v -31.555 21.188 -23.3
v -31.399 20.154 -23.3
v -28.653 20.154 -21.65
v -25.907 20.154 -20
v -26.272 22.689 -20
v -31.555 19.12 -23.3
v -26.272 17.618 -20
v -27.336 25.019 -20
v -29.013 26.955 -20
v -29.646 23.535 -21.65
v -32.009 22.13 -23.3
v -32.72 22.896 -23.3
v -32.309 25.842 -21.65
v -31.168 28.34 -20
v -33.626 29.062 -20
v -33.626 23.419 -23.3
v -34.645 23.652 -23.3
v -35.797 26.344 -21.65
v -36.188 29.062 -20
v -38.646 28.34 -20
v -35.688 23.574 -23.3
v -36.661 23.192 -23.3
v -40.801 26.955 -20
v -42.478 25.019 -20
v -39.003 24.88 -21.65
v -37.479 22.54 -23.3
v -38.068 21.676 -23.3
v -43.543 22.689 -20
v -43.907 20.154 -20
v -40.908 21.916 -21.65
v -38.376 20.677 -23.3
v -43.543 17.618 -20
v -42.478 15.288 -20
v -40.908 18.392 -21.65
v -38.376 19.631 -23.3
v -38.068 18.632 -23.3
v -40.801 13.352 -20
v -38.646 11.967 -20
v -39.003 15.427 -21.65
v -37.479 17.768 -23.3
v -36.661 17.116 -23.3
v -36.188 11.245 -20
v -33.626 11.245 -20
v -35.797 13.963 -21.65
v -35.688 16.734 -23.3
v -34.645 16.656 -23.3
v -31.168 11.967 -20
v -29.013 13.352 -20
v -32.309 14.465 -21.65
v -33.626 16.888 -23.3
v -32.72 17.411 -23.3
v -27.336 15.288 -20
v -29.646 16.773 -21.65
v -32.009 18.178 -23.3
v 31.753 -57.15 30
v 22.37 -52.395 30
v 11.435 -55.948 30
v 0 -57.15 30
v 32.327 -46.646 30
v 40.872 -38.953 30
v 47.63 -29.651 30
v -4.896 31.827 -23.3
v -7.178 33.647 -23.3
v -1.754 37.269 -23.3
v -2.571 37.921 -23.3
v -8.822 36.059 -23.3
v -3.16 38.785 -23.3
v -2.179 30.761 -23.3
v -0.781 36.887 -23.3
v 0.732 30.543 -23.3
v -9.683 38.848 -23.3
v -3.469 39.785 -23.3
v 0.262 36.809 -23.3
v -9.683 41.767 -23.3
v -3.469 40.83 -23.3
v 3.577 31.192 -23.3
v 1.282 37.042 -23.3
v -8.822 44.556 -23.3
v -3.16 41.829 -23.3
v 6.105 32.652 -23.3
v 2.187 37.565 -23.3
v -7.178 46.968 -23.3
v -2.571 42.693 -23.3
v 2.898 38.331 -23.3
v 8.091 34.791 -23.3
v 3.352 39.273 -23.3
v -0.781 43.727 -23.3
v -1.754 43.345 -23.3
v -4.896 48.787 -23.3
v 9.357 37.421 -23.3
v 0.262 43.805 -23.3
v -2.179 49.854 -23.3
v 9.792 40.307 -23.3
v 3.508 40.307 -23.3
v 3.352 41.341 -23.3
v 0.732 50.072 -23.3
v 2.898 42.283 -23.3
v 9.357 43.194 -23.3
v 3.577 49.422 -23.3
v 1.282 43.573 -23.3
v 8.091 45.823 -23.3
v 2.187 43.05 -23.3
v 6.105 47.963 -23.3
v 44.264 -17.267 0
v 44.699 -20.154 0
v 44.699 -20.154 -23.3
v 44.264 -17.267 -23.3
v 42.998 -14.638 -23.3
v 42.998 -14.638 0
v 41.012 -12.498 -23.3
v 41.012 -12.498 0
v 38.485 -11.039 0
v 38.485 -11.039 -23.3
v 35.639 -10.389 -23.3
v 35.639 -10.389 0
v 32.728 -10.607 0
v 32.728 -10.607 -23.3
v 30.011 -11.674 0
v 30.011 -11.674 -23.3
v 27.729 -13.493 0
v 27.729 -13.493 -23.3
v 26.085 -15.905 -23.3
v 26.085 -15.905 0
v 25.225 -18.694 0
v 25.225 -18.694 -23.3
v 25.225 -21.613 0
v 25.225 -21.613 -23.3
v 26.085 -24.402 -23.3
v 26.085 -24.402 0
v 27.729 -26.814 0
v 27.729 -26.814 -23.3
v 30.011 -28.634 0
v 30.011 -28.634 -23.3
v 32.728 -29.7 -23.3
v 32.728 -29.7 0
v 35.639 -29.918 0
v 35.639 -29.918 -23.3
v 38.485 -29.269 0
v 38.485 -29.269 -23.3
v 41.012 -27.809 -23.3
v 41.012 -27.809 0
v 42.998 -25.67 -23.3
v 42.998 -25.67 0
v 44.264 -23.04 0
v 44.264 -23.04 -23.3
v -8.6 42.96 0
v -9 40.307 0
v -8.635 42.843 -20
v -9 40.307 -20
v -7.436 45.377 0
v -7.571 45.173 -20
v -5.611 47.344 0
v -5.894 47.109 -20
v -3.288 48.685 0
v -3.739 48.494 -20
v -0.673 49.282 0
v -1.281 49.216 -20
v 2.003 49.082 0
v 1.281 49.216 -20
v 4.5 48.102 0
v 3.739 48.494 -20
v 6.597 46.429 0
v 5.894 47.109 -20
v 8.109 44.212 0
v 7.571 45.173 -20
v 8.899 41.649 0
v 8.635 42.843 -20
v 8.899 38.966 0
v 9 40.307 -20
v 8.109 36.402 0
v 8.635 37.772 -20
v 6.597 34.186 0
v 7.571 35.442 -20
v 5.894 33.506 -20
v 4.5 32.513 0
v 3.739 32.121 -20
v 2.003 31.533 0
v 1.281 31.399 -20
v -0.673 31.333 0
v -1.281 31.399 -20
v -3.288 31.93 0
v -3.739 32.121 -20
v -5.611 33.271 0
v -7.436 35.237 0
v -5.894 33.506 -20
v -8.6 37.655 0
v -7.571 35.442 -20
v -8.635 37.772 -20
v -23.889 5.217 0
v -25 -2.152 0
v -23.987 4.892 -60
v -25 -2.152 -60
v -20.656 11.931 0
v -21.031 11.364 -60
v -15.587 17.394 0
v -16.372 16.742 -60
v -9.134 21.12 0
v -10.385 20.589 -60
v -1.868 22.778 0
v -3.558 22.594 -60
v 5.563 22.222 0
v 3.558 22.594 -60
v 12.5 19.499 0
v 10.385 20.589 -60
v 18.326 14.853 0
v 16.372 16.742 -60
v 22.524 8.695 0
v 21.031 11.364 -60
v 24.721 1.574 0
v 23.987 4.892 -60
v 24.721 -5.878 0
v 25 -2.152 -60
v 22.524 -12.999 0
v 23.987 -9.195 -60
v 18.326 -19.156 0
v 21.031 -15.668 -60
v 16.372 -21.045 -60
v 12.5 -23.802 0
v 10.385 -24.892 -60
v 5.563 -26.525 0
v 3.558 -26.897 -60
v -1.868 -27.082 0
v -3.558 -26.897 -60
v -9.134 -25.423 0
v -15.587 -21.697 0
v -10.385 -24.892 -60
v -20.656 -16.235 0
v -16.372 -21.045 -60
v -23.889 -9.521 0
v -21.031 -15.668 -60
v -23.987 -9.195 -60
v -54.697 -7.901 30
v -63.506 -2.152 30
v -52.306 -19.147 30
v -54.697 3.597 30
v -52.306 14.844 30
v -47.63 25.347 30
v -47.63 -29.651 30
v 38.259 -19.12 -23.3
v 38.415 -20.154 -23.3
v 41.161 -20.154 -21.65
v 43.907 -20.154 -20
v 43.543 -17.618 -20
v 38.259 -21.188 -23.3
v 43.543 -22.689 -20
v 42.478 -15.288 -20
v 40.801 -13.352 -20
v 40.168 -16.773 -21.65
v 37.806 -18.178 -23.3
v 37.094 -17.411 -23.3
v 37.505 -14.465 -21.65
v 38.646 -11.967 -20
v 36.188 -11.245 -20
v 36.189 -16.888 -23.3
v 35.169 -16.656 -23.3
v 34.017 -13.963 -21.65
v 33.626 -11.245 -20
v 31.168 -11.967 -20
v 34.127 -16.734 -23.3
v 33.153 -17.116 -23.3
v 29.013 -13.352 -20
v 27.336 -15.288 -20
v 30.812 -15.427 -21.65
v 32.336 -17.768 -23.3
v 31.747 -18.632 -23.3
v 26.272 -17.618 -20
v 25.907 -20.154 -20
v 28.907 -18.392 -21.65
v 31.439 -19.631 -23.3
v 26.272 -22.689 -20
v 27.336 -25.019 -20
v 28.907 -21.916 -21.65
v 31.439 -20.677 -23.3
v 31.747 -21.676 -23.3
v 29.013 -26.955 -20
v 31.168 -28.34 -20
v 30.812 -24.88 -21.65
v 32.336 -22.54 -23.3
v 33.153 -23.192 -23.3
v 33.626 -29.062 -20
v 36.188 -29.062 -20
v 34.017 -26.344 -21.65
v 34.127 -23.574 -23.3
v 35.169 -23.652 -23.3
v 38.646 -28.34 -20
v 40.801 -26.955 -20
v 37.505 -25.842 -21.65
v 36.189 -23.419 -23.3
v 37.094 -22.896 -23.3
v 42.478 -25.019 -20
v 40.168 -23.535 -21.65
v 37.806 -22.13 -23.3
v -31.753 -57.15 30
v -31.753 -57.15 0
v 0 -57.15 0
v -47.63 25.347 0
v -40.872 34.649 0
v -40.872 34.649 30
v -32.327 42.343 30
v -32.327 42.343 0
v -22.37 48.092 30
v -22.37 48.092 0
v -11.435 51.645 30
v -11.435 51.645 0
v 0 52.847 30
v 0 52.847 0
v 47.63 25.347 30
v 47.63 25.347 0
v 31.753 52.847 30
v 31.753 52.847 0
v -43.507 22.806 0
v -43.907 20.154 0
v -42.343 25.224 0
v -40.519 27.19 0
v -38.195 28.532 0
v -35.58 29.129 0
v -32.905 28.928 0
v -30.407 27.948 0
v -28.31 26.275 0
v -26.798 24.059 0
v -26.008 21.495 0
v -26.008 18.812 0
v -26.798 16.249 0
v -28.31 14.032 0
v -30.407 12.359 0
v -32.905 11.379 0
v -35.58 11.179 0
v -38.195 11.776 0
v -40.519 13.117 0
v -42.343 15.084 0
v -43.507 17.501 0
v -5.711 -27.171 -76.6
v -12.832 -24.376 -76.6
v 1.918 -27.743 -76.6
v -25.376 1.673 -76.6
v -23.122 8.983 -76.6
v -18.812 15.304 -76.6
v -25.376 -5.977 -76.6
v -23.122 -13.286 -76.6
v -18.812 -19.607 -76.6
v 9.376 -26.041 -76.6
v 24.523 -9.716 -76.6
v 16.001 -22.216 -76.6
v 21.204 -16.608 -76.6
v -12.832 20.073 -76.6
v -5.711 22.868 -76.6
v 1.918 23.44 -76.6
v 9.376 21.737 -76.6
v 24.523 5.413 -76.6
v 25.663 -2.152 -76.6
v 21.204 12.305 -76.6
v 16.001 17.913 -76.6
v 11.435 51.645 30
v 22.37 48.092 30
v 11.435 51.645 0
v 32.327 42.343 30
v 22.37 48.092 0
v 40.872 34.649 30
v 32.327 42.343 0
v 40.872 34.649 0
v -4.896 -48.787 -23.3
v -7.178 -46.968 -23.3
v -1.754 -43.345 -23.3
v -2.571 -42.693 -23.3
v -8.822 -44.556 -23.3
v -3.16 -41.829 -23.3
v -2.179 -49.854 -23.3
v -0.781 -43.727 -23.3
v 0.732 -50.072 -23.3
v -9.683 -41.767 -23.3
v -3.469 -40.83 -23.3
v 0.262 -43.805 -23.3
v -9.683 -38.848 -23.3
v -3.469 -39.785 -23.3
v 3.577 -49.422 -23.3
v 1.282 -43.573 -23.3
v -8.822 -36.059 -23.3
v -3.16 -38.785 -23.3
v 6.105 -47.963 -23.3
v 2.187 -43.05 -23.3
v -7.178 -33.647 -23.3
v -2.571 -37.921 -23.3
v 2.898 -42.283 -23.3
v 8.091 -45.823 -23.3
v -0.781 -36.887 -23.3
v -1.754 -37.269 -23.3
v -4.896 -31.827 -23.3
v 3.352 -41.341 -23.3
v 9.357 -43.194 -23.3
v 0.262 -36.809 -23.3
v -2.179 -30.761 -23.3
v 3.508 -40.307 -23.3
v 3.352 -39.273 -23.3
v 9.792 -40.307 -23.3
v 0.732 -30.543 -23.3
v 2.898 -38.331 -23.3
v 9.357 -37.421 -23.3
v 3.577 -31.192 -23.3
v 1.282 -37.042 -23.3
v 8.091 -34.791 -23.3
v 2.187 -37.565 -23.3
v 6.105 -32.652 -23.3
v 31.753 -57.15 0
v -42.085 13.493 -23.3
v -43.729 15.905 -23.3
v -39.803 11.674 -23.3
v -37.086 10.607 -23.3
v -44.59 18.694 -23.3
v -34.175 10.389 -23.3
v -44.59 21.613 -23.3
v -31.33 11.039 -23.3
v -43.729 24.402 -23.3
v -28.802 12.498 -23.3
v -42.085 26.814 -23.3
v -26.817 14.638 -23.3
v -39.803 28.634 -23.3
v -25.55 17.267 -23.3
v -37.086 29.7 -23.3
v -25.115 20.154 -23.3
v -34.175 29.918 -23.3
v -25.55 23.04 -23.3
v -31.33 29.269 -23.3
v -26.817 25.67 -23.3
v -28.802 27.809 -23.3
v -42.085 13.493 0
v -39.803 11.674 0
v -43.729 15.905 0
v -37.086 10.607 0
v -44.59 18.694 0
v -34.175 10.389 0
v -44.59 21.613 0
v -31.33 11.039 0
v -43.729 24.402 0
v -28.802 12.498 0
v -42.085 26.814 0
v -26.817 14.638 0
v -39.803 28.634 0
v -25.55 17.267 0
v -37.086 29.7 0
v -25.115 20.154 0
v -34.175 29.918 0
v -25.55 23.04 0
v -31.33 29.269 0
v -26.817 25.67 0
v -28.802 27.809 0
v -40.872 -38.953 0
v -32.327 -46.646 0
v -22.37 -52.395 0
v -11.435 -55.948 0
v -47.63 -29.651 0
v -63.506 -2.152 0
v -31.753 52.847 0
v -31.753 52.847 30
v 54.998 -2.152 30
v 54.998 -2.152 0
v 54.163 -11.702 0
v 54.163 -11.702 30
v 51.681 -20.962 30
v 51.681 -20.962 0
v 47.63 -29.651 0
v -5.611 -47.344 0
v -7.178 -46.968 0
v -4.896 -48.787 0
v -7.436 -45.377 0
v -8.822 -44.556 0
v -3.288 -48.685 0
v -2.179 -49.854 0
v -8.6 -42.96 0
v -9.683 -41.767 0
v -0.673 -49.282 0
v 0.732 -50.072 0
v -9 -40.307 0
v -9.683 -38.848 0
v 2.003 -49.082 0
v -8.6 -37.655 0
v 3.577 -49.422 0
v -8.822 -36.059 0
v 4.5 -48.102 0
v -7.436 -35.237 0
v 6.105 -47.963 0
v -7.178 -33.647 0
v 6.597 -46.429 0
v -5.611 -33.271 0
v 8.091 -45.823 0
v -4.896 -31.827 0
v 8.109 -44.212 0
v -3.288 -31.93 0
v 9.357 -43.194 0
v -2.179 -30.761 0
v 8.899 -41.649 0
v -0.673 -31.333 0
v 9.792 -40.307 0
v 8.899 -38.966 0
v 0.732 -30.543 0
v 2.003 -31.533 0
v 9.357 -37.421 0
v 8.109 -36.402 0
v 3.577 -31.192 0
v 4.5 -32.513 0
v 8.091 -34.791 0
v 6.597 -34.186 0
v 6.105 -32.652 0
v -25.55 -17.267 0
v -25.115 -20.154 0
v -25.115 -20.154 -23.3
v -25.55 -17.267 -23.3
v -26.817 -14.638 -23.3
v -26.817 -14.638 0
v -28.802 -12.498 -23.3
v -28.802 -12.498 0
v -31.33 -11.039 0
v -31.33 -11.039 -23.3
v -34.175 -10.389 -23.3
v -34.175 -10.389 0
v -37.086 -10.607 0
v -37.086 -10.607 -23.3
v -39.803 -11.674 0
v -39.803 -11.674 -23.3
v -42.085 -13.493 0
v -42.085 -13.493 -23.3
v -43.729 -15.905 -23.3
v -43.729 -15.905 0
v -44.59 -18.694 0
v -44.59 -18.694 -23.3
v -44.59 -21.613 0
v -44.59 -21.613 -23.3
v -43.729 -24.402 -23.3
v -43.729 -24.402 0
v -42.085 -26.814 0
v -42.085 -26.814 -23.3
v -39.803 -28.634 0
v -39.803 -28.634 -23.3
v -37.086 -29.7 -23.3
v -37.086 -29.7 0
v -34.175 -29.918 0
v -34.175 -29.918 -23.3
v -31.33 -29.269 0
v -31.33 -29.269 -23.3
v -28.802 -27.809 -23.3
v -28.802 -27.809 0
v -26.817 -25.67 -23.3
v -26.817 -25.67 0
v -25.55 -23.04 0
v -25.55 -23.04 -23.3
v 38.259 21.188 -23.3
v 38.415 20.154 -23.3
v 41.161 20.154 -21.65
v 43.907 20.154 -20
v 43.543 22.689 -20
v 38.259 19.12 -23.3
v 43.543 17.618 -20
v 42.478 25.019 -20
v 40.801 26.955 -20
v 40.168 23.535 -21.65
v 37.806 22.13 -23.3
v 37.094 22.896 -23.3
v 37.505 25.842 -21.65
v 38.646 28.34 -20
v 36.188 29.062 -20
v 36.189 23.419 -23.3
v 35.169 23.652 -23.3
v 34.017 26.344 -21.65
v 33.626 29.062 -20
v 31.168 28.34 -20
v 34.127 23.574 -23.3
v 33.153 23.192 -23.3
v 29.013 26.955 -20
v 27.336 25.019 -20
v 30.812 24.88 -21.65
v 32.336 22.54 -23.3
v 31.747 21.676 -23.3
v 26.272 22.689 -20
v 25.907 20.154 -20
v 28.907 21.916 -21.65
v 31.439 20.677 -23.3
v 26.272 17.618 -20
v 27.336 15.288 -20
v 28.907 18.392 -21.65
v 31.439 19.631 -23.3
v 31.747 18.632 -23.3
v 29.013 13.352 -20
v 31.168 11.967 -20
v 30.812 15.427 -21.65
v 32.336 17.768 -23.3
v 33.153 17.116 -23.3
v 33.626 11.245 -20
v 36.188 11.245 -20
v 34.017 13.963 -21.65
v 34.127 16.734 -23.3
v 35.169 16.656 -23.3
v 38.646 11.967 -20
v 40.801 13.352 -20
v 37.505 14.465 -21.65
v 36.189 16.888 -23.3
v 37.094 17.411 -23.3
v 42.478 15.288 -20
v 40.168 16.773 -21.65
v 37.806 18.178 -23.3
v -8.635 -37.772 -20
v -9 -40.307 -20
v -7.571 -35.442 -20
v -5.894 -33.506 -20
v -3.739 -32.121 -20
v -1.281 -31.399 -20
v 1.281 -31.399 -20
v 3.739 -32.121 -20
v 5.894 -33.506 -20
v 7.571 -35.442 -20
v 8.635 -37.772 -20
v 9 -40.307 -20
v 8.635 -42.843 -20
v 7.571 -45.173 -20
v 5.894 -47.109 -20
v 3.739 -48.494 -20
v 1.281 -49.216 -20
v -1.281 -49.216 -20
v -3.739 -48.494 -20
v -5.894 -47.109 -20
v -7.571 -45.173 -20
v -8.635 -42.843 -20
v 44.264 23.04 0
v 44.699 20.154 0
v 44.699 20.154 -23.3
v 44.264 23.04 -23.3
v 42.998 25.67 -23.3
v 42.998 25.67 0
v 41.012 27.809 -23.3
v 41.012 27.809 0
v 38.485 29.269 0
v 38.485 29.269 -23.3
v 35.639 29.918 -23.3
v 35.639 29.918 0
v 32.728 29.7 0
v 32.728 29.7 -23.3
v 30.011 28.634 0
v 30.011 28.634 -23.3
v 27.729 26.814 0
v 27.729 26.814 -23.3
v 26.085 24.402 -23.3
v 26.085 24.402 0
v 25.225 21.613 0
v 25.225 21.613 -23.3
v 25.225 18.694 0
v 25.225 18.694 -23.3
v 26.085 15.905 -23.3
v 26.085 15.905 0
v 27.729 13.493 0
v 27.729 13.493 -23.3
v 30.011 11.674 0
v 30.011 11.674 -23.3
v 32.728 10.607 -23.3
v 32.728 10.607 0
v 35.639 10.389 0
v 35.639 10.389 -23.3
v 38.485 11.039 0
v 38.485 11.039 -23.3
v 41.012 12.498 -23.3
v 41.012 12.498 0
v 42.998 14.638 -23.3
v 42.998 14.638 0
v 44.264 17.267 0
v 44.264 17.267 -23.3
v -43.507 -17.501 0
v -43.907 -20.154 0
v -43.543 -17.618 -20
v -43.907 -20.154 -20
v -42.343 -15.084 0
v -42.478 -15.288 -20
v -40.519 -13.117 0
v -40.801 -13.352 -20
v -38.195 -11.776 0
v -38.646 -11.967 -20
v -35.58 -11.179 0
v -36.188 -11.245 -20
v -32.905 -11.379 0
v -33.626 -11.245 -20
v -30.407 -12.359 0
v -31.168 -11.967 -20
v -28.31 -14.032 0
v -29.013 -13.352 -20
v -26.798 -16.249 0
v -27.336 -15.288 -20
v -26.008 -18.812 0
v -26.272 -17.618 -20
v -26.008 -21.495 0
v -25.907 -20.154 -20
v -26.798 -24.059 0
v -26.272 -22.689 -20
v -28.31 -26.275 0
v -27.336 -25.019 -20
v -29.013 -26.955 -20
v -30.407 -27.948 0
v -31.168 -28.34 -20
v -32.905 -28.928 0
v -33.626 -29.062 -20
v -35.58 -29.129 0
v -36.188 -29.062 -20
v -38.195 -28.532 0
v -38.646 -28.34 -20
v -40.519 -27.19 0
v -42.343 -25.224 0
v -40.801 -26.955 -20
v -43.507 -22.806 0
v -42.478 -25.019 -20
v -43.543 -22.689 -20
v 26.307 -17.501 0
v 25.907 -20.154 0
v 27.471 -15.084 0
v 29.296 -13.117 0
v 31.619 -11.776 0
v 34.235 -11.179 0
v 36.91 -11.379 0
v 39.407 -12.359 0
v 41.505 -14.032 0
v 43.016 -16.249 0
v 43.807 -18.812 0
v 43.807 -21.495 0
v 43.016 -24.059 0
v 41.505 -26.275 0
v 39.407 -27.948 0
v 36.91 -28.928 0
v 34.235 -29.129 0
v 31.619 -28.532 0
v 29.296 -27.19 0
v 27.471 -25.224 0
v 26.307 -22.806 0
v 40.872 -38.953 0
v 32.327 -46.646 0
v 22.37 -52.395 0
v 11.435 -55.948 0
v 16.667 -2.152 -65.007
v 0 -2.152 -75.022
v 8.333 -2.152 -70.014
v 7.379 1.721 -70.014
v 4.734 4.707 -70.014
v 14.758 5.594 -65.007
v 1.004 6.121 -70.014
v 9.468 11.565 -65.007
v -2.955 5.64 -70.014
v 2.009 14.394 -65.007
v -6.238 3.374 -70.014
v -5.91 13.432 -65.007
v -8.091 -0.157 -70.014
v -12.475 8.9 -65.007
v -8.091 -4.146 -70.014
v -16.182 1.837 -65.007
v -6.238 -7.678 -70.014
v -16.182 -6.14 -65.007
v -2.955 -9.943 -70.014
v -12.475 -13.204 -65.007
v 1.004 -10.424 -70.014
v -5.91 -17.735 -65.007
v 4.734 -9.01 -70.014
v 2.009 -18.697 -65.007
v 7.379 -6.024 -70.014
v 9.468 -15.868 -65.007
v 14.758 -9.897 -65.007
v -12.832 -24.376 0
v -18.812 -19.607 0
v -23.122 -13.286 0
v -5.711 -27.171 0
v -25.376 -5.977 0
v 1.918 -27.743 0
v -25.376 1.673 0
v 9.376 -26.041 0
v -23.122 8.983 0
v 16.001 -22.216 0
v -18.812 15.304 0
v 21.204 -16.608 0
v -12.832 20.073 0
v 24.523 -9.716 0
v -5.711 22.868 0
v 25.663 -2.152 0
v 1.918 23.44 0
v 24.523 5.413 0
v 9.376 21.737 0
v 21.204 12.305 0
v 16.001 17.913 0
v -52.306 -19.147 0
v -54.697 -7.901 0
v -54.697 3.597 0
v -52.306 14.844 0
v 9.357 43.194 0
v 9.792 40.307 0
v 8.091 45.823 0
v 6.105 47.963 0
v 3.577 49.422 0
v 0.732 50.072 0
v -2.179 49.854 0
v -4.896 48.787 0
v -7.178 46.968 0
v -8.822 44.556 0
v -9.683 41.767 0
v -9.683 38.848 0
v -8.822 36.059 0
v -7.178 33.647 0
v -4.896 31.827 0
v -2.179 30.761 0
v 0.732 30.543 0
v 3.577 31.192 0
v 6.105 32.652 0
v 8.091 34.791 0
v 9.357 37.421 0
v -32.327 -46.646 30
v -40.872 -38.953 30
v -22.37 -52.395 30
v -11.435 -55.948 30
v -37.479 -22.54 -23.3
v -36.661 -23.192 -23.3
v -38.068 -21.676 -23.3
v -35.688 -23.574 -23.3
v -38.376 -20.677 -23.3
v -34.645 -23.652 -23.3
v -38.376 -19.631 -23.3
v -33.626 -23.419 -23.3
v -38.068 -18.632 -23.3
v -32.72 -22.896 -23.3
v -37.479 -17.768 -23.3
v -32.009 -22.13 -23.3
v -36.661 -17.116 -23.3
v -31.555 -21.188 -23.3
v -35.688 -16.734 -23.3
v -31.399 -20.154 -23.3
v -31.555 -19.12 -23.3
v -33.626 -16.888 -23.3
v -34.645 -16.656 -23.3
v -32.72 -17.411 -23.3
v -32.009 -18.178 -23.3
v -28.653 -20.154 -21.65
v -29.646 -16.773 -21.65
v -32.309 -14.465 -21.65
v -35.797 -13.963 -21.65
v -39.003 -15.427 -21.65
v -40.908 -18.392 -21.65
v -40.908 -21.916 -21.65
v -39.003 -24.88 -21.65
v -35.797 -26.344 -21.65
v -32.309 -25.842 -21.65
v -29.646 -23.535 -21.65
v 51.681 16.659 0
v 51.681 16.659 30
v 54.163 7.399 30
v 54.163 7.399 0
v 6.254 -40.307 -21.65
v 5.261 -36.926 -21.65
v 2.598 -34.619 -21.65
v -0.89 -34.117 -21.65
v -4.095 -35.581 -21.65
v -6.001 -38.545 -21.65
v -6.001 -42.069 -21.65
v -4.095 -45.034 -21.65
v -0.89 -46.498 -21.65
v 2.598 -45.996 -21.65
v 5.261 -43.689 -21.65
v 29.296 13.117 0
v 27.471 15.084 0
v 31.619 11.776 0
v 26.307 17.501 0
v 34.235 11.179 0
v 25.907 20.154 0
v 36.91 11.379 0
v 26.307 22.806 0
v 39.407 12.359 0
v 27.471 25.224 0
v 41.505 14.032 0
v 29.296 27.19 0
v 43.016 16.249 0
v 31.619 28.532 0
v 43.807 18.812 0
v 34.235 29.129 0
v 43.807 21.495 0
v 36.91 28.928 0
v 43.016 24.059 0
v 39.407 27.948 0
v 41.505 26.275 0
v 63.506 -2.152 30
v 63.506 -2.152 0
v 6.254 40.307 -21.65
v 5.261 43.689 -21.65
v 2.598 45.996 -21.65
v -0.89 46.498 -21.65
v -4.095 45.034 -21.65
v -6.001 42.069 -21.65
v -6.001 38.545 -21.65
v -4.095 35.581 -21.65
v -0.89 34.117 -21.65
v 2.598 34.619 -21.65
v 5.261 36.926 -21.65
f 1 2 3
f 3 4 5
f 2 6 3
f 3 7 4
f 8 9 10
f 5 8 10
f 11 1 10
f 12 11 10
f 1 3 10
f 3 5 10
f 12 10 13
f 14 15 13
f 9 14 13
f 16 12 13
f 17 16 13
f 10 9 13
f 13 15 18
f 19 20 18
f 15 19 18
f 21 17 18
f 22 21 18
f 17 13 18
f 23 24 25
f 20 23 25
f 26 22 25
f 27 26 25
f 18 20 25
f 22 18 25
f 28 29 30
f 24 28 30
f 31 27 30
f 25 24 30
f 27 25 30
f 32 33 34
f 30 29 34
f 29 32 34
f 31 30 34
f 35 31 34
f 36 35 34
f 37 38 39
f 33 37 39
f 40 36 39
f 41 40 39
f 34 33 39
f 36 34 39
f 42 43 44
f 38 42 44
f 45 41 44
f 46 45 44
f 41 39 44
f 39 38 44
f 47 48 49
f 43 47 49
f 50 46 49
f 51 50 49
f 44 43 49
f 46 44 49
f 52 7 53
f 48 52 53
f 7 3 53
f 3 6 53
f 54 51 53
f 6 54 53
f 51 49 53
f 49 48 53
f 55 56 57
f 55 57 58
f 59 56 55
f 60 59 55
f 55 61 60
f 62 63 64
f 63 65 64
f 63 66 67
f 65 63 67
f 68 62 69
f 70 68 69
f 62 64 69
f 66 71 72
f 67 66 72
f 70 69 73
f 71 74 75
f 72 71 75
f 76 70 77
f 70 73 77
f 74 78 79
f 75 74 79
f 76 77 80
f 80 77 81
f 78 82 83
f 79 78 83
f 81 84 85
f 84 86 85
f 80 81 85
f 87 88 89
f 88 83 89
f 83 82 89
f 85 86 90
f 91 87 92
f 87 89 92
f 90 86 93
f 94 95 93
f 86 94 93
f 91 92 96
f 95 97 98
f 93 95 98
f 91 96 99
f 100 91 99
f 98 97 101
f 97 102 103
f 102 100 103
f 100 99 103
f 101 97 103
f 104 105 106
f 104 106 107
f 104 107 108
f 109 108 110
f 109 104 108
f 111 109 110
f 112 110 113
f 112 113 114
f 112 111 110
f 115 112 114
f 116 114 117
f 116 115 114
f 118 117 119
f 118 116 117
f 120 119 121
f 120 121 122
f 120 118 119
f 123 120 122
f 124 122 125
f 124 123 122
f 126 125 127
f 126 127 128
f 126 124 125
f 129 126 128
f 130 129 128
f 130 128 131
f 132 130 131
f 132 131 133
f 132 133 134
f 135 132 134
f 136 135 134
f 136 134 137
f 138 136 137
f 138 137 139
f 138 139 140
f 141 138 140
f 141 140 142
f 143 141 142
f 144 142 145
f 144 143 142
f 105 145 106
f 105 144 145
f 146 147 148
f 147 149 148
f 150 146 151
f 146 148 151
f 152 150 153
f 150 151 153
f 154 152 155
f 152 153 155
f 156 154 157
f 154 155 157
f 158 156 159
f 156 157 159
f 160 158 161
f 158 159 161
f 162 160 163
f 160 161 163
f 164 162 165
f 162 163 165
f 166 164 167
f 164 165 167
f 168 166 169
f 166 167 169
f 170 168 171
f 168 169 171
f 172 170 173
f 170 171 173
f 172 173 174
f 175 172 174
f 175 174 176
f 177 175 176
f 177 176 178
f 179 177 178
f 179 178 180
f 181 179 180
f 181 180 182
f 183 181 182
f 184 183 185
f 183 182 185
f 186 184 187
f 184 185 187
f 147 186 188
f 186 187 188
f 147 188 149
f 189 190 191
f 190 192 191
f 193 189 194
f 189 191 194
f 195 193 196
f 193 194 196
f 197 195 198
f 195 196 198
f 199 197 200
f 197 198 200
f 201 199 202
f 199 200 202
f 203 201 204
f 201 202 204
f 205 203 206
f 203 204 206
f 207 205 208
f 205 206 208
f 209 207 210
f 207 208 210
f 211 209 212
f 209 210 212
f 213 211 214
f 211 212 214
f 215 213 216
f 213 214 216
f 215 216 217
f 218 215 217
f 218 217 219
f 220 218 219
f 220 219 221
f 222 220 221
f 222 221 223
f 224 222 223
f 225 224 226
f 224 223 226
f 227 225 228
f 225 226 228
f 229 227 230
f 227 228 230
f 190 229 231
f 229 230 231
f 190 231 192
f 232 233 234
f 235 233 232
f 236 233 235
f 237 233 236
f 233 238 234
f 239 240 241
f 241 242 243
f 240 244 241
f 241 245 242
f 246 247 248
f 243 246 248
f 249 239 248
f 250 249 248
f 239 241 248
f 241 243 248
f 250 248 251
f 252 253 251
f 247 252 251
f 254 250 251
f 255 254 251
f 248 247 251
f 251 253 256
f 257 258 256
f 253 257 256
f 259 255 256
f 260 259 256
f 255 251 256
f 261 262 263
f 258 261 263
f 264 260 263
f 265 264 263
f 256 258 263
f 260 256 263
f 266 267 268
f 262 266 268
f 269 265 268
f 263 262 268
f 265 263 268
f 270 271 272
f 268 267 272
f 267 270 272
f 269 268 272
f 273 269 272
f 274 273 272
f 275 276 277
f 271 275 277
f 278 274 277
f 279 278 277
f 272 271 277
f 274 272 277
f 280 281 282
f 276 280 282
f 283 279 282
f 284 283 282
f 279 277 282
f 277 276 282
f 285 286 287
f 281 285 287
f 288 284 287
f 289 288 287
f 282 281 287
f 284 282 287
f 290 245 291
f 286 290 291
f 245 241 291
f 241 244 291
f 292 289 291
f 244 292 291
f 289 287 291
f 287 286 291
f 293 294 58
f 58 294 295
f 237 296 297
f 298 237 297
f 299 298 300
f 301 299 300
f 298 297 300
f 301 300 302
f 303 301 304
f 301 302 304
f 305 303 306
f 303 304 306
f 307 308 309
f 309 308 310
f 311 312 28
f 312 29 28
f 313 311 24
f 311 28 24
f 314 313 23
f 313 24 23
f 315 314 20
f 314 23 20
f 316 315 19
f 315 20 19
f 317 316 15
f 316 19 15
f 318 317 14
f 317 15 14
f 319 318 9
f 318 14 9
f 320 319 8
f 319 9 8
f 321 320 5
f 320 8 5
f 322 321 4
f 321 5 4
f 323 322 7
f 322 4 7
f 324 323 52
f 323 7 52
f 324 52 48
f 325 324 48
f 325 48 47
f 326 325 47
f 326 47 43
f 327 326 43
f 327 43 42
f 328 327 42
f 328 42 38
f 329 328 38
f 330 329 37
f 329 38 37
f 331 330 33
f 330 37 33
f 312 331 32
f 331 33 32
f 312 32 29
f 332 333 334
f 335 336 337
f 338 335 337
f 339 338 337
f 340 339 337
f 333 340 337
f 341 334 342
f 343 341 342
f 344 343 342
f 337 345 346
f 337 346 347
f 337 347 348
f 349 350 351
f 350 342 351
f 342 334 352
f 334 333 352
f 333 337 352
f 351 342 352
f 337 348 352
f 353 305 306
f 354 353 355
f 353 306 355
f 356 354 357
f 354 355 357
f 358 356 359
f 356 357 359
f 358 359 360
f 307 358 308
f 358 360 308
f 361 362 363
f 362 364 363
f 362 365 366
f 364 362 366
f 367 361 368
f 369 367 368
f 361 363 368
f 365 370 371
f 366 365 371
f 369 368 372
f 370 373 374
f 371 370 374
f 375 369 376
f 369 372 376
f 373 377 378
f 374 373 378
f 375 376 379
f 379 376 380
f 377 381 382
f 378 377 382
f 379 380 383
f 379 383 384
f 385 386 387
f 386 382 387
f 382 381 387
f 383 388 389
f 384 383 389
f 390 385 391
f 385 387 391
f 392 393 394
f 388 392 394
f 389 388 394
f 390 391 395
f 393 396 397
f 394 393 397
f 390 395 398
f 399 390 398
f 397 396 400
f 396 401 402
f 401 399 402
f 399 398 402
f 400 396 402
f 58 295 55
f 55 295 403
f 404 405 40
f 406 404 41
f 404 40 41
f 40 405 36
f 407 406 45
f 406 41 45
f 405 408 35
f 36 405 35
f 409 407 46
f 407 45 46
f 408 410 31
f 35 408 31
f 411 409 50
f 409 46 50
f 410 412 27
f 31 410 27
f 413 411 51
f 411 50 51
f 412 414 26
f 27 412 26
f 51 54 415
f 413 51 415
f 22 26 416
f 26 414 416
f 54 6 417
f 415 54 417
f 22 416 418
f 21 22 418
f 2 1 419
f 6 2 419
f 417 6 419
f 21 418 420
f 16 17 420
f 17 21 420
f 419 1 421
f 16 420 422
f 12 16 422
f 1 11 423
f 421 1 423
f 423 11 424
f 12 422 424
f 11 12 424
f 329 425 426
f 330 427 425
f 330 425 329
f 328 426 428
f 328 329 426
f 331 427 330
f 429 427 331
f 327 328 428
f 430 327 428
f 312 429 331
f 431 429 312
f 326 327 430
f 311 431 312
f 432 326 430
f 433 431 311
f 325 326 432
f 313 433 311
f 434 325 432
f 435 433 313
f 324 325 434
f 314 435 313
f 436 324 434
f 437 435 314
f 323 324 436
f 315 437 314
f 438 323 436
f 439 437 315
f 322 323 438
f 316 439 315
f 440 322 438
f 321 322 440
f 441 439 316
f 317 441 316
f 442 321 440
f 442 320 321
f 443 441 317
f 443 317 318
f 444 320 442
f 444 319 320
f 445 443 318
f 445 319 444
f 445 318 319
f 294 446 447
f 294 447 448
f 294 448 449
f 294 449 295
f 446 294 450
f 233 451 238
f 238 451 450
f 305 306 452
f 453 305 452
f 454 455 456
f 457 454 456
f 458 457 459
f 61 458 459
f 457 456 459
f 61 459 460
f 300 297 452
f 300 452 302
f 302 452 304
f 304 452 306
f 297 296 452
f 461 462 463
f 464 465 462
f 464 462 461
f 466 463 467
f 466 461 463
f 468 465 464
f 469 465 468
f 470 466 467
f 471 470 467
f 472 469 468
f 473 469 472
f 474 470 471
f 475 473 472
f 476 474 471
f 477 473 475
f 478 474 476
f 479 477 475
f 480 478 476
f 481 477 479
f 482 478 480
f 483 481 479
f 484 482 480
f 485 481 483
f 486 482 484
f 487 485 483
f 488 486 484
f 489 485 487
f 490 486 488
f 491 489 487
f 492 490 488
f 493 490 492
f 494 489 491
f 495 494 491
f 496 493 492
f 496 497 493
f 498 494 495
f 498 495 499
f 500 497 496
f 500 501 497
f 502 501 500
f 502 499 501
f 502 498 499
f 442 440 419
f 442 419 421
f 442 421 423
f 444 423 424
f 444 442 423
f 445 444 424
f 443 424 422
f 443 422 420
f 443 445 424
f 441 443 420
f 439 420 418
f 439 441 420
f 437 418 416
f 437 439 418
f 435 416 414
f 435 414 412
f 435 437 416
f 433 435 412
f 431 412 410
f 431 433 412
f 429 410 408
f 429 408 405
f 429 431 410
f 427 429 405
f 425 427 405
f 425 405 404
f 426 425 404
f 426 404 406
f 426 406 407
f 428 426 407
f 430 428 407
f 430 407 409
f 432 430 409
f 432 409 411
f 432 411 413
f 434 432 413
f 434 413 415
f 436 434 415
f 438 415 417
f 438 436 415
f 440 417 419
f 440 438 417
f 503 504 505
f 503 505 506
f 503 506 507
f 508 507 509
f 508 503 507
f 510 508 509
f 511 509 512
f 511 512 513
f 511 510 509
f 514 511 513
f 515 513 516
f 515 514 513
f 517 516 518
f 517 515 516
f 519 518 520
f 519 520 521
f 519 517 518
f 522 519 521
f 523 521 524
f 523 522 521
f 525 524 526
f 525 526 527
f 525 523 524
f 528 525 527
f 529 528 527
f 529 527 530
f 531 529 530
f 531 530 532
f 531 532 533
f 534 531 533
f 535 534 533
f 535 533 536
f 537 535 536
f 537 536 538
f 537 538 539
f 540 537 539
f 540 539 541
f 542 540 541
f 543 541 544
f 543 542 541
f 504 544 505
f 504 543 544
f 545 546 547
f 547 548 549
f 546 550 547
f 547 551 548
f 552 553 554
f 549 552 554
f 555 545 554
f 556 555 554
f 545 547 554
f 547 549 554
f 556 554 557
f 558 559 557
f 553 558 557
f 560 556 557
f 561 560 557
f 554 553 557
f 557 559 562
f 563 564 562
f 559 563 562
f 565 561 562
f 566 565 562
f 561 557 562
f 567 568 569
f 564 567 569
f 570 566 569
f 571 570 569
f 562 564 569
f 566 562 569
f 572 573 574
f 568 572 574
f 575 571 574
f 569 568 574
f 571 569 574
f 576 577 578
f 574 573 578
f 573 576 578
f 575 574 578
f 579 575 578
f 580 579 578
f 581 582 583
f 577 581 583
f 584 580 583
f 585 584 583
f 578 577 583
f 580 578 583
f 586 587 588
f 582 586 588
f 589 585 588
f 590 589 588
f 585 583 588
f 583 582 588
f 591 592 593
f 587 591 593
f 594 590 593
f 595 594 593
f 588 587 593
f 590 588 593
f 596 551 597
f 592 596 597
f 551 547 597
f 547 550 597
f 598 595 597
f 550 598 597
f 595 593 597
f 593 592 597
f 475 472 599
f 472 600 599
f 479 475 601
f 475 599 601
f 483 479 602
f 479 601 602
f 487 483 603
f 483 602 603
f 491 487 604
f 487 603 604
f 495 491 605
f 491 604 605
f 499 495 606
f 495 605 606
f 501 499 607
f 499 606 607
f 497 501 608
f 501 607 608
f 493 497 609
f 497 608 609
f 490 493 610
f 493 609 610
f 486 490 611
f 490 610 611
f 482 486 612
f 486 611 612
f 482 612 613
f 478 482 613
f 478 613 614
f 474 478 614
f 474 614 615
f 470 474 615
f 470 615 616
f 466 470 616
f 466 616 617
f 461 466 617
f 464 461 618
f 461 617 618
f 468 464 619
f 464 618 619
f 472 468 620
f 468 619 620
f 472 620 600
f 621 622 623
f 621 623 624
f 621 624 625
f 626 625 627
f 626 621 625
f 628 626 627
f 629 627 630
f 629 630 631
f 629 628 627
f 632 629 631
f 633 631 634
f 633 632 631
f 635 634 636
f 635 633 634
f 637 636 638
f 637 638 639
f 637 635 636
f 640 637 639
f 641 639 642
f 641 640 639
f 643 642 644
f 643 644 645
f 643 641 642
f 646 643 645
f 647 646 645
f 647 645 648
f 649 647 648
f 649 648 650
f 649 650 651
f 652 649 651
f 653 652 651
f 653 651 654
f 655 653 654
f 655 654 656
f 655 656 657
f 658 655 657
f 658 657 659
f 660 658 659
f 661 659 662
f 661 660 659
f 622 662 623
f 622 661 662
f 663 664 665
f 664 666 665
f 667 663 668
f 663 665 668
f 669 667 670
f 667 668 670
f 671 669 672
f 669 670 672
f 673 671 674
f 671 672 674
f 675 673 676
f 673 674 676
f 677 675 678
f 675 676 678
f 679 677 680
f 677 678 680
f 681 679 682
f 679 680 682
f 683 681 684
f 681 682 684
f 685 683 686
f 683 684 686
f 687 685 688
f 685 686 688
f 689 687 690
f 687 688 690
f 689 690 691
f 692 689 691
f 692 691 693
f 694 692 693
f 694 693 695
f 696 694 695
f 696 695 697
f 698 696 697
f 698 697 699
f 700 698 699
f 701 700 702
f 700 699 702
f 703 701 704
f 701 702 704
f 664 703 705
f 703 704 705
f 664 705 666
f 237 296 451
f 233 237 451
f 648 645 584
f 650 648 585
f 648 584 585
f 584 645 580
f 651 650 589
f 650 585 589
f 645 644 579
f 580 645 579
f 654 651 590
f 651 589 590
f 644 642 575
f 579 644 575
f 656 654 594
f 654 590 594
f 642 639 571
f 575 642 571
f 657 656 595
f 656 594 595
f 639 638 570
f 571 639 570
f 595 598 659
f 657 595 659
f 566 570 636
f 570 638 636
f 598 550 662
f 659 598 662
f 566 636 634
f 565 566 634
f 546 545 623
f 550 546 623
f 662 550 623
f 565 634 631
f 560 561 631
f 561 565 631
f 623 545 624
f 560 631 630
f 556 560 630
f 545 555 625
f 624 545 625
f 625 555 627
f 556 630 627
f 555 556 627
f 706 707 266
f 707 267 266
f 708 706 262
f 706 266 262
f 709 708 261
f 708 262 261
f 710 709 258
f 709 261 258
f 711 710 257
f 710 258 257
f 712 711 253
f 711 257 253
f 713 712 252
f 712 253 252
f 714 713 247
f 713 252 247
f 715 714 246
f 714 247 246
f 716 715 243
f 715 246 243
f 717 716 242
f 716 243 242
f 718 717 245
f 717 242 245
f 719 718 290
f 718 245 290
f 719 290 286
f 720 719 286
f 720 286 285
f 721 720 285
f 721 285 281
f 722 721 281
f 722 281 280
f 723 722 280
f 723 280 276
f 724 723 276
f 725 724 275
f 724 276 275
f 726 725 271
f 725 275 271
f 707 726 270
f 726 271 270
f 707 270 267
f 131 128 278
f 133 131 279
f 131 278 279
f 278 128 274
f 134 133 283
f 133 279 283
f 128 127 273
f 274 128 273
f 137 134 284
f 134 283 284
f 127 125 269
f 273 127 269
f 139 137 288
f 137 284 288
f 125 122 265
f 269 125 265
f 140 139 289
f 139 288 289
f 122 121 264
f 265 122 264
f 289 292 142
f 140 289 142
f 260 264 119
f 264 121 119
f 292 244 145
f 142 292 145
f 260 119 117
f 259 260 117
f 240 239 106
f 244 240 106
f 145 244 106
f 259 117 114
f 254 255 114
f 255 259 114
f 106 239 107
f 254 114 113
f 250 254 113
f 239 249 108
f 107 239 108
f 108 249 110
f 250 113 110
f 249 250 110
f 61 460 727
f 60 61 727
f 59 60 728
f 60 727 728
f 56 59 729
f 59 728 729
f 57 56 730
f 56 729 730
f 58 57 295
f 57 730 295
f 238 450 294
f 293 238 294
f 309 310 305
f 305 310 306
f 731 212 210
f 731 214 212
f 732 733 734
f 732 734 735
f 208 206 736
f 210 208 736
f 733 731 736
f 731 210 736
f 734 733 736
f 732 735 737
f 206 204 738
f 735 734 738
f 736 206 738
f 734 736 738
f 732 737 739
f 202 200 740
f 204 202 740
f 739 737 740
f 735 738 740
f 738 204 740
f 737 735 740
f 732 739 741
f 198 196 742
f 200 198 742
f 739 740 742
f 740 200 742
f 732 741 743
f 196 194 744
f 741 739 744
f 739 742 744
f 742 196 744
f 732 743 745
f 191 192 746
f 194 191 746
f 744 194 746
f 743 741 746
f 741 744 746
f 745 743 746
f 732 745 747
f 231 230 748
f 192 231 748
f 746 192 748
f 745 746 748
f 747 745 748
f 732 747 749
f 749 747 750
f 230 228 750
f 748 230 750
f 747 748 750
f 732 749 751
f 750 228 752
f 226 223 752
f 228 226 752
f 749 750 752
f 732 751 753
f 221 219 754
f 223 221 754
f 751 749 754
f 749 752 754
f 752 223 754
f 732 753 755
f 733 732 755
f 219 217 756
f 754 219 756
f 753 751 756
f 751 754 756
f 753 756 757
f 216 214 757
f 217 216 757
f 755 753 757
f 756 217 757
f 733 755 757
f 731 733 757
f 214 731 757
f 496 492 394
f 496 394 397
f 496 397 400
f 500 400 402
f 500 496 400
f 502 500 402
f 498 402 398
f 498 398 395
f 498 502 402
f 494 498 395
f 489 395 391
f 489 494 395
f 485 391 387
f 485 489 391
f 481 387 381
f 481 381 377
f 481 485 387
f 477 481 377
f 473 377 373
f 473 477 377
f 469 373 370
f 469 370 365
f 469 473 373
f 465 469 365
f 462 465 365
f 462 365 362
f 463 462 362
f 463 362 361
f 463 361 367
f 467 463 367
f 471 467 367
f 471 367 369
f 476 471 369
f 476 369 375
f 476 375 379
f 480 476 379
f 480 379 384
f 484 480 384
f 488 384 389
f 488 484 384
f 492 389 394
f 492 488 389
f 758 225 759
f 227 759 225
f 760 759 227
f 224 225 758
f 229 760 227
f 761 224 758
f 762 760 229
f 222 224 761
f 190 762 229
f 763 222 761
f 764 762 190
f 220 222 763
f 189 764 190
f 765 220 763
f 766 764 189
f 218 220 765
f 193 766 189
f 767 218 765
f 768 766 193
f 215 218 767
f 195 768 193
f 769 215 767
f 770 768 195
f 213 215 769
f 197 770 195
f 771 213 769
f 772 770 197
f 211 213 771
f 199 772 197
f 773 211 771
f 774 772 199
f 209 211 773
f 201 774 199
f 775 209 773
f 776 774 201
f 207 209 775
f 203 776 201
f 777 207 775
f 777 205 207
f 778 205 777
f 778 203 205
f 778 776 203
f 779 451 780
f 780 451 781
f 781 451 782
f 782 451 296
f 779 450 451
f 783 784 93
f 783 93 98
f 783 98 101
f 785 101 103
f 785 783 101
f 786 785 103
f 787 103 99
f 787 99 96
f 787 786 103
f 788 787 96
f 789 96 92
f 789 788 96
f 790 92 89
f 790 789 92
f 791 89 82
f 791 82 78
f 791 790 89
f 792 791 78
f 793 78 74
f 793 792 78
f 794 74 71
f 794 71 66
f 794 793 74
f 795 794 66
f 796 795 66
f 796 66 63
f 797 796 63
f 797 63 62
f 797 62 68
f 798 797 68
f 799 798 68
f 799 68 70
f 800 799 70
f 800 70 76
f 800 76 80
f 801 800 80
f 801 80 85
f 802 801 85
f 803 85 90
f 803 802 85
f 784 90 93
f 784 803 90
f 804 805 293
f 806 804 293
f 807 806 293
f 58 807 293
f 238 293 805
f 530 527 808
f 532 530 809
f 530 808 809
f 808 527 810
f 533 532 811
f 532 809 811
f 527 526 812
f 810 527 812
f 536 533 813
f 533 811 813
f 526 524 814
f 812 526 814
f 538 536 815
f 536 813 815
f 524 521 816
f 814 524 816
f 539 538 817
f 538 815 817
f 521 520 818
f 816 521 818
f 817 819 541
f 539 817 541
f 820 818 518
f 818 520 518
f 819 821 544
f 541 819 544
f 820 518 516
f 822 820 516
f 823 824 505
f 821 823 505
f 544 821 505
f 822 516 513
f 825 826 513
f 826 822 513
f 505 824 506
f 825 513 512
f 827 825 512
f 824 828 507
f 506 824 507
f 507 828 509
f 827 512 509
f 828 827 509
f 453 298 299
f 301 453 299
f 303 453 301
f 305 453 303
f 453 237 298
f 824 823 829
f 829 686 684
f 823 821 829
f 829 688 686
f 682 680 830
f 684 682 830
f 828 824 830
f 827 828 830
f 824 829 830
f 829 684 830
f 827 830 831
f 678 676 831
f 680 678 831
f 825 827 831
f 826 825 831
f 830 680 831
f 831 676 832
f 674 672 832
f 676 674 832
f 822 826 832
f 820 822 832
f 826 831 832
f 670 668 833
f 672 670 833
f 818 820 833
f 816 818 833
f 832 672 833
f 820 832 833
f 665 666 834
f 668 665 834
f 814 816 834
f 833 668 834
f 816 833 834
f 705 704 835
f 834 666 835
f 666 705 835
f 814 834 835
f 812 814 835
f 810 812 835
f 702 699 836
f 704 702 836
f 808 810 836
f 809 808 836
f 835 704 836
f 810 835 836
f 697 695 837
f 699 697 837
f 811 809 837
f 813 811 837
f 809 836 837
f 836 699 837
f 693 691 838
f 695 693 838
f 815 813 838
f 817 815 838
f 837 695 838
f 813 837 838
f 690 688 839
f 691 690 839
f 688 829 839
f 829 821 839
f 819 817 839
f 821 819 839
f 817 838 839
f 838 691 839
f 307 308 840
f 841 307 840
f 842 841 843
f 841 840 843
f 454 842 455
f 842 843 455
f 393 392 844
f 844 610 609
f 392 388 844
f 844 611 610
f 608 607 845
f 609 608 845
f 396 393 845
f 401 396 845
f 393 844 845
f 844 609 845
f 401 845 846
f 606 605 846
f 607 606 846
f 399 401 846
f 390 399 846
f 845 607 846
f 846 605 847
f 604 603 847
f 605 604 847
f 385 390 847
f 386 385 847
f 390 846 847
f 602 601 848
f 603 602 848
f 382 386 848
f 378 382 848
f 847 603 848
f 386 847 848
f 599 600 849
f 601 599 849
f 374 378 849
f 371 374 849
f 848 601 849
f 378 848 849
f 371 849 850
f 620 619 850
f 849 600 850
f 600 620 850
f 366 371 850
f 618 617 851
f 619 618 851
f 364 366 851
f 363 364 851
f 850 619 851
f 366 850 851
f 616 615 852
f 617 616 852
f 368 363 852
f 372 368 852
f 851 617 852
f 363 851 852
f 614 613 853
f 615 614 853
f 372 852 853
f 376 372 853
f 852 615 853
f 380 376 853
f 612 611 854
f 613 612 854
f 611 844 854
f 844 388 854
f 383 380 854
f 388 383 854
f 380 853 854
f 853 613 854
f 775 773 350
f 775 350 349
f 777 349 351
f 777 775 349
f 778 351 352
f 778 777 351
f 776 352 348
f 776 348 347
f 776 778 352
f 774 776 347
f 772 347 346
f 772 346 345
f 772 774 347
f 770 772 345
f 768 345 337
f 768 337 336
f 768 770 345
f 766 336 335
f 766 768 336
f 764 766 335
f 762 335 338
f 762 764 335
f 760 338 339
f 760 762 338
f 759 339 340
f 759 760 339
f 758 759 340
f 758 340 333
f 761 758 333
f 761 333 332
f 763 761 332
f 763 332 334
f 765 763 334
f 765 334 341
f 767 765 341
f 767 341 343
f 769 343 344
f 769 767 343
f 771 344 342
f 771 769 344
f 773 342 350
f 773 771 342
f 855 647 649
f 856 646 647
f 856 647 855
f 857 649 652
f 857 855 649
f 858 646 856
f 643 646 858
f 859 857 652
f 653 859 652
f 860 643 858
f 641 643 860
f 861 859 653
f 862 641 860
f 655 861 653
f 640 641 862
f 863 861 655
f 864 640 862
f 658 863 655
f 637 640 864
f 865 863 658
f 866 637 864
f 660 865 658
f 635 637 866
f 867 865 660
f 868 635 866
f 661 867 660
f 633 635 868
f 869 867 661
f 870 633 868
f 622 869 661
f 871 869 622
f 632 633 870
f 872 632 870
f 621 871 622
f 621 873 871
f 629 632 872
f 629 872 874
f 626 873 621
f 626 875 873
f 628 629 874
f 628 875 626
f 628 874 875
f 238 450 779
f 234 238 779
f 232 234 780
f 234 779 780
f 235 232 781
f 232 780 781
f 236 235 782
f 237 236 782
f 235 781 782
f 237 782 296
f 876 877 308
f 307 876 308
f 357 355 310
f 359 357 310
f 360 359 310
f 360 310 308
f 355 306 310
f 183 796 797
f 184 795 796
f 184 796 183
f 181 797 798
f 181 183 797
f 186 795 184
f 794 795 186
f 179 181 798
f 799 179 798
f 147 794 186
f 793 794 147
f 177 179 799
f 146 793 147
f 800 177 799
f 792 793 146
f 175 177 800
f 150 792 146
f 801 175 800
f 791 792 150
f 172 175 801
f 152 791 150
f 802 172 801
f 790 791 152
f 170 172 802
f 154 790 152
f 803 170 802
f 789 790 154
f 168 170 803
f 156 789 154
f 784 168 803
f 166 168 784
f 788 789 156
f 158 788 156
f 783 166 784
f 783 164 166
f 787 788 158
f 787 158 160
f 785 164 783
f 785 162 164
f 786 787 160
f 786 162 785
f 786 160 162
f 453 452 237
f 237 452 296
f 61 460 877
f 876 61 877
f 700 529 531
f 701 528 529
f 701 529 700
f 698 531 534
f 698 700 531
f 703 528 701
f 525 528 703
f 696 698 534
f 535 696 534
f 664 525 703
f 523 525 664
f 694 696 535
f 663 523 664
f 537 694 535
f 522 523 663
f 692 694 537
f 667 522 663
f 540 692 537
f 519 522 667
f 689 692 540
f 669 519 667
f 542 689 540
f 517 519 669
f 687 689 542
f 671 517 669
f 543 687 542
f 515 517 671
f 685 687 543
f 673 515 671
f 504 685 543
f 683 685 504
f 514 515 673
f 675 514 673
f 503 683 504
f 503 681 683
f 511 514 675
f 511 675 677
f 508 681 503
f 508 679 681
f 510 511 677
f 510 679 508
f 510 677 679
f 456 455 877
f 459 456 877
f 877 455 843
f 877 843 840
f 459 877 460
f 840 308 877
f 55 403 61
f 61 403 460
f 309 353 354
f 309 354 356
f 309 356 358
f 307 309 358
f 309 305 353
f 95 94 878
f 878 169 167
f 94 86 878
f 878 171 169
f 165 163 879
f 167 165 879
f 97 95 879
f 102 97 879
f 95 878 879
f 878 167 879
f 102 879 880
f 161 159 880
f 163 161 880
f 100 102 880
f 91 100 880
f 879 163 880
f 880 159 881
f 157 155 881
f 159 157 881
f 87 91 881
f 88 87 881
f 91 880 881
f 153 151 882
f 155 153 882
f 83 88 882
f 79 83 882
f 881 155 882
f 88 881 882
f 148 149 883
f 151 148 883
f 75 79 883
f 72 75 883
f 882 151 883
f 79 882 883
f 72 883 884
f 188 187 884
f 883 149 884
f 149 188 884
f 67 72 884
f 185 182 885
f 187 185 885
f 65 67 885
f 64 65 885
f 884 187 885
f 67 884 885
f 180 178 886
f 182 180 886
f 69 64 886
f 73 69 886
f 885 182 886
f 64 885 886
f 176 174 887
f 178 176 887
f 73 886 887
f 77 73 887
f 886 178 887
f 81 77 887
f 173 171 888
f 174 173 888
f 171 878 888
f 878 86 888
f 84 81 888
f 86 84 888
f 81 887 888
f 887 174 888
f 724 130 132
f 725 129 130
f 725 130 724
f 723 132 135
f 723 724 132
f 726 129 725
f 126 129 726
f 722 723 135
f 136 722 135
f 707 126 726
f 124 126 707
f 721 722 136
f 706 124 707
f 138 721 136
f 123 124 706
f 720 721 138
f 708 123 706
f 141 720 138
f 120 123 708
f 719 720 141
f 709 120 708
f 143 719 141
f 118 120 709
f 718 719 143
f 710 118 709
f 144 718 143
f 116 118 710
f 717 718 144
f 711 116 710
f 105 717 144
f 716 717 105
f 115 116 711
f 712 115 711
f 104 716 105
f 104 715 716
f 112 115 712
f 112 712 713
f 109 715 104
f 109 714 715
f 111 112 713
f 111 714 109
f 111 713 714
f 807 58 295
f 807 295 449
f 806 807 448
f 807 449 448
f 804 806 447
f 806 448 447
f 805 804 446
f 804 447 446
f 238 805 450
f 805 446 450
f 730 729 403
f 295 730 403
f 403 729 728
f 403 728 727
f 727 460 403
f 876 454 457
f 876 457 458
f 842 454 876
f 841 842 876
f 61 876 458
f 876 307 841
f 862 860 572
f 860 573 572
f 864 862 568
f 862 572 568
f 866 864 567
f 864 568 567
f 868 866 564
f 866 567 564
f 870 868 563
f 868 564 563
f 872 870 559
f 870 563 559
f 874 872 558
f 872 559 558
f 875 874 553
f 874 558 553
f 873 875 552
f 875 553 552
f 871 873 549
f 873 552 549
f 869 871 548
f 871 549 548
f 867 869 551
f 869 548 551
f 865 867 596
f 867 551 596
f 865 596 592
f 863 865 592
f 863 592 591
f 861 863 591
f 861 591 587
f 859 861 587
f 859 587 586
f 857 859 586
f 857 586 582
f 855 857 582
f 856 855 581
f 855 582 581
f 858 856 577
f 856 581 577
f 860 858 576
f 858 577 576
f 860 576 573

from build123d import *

# Parameters (mm, degrees)
F0_R       = 25.6630058186
F1_DEPTH   = 76.6
F2_D       = 50
F2_DEPTH   = 60
F2_TIP     = 15.0215154757
F3_DEPTH   = 30
F4_R       = 9.7919949692
F5_DEPTH   = 23.3
F6_D       = 18
F6_DEPTH   = 20
F6_TIP     = 5.4077455712
F6_2_D     = 18
F6_2_DEPTH = 20
F6_2_TIP   = 5.4077455712
F6_3_D     = 18
F6_3_DEPTH = 20
F6_3_TIP   = 5.4077455712
F6_4_D     = 18
F6_4_DEPTH = 20
F6_4_TIP   = 5.4077455712
F6_5_D     = 18
F6_5_DEPTH = 20
F6_5_TIP   = 5.4077455712
F6_6_D     = 18
F6_6_DEPTH = 20
F6_6_TIP   = 5.4077455712


with BuildPart() as f1:
    # F0 (on Top) → F1 (new body)
    with BuildSketch(Plane.XY):
        with Locations((0, -2.1516394336)):
            Circle(F0_R)
    extrude(amount=-F1_DEPTH)

    # F2
    with Locations(Plane.XY):
        with Locations((0, -2.1516394336)):
            Hole(F2_D / 2, depth=F2_DEPTH)
            with Locations((0, 0, -(F2_DEPTH + F2_TIP / 2))):  # 118° drill point
                Cone(0, F2_D / 2, F2_TIP, mode=Mode.SUBTRACT)


with BuildPart() as f3:
    # F0 (on Top) → F3 (new body)
    with BuildSketch(Plane.XY):
        with BuildLine():
            ThreePointArc((-47.6298648429, 25.3474739188), (-27.499115517, 45.4782241596), (3.13e-08, 52.8465901754))
            Line((3.13e-08, 52.8465901754), (-31.7532426697, 52.8465901754))
            Line((-31.7532426697, 52.8465901754), (-47.6298648429, 25.3474739188))
        make_face()
    extrude(amount=F3_DEPTH)


with BuildPart() as f3b:
    # F0 (on Top) → F3, piece 2 (new body)
    with BuildSketch(Plane.XY):
        with BuildLine():
            ThreePointArc((-47.6298641461, -29.6507539929), (-54.998229609, -2.1516401304), (-47.6298648429, 25.3474739188))
            Line((-47.6298648429, 25.3474739188), (-63.5064853394, -2.1516394336))
            Line((-63.5064853394, -2.1516394336), (-47.6298641461, -29.6507539929))
        make_face()
    extrude(amount=F3_DEPTH)


with BuildPart() as f3c:
    # F0 (on Top) → F3, piece 3 (new body)
    with BuildSketch(Plane.XY):
        with BuildLine():
            Line((-31.7532426697, -57.1498690425), (0, -57.1498690425))
            ThreePointArc((0, -57.1498690425), (-27.4991149271, -49.7815033673), (-47.6298641461, -29.6507539929))
            Line((-47.6298641461, -29.6507539929), (-31.7532426697, -57.1498690425))
        make_face()
    extrude(amount=F3_DEPTH)


with BuildPart() as f3d:
    # F0 (on Top) → F3, piece 4 (new body)
    with BuildSketch(Plane.XY):
        with BuildLine():
            Line((31.7532426697, -57.1498690425), (47.6298637472, -29.6507546837))
            ThreePointArc((47.6298637472, -29.6507546837), (27.4991145817, -49.7815035667), (0, -57.1498690425))
            Line((0, -57.1498690425), (31.7532426697, -57.1498690425))
        make_face()
    extrude(amount=F3_DEPTH)


with BuildPart() as f3e:
    # F0 (on Top) → F3, piece 5 (new body)
    with BuildSketch(Plane.XY):
        with BuildLine():
            ThreePointArc((3.13e-08, 52.8465901754), (27.4991147982, 45.4782245746), (47.6298639816, 25.3474754107))
            Line((47.6298639816, 25.3474754107), (31.7532426697, 52.8465901754))
            Line((31.7532426697, 52.8465901754), (3.13e-08, 52.8465901754))
        make_face()
    extrude(amount=F3_DEPTH)


with BuildPart() as f3f:
    # F0 (on Top) → F3, piece 6 (new body)
    with BuildSketch(Plane.XY):
        with BuildLine():
            ThreePointArc((47.6298639816, 25.3474754107), (53.1242103735, 12.0829498583), (54.998229609, -2.1516394336))
            ThreePointArc((54.998229609, -2.1516394336), (53.1242103129, -16.3862289518), (47.6298637472, -29.6507546837))
            Line((47.6298637472, -29.6507546837), (63.5064853394, -2.1516394336))
            Line((63.5064853394, -2.1516394336), (47.6298639816, 25.3474754107))
        make_face()
    extrude(amount=F3_DEPTH)


with BuildPart() as f5:
    # F4 (on face) → F5 (new body)
    with BuildSketch(Plane.XY):
        with Locations((0, 40.3073765337)):
            Circle(F4_R)
    extrude(amount=-F5_DEPTH)

    # F6
    with Locations(Plane.XY):
        with Locations((-34.9072120381, 20.1536882669), (0, 40.3073765337), (34.9072120381, 20.1536882669), (34.9072120381, -20.1536882669), (0, -40.3073765337), (-34.9072120381, -20.1536882669)):
            Hole(F6_D / 2, depth=F6_DEPTH)
            with Locations((0, 0, -(F6_DEPTH + F6_TIP / 2))):  # 118° drill point
                Cone(0, F6_D / 2, F6_TIP, mode=Mode.SUBTRACT)


with BuildPart() as f5b:
    # F4 (on face) → F5, piece 2 (new body)
    with BuildSketch(Plane.XY):
        with Locations((-34.9072120381, 20.1536882669)):
            Circle(F4_R)
    extrude(amount=-F5_DEPTH)

    # F6#2
    with Locations(Plane.XY):
        with Locations((-34.9072120381, 20.1536882669), (0, 40.3073765337), (34.9072120381, 20.1536882669), (34.9072120381, -20.1536882669), (0, -40.3073765337), (-34.9072120381, -20.1536882669)):
            Hole(F6_2_D / 2, depth=F6_2_DEPTH)
            with Locations((0, 0, -(F6_2_DEPTH + F6_2_TIP / 2))):  # 118° drill point
                Cone(0, F6_2_D / 2, F6_2_TIP, mode=Mode.SUBTRACT)


with BuildPart() as f5c:
    # F4 (on face) → F5, piece 3 (new body)
    with BuildSketch(Plane.XY):
        with Locations((-34.9072120381, -20.1536882669)):
            Circle(F4_R)
    extrude(amount=-F5_DEPTH)

    # F6#3
    with Locations(Plane.XY):
        with Locations((-34.9072120381, 20.1536882669), (0, 40.3073765337), (34.9072120381, 20.1536882669), (34.9072120381, -20.1536882669), (0, -40.3073765337), (-34.9072120381, -20.1536882669)):
            Hole(F6_3_D / 2, depth=F6_3_DEPTH)
            with Locations((0, 0, -(F6_3_DEPTH + F6_3_TIP / 2))):  # 118° drill point
                Cone(0, F6_3_D / 2, F6_3_TIP, mode=Mode.SUBTRACT)


with BuildPart() as f5d:
    # F4 (on face) → F5, piece 4 (new body)
    with BuildSketch(Plane.XY):
        with Locations((0, -40.3073765337)):
            Circle(F4_R)
    extrude(amount=-F5_DEPTH)

    # F6#4
    with Locations(Plane.XY):
        with Locations((-34.9072120381, 20.1536882669), (0, 40.3073765337), (34.9072120381, 20.1536882669), (34.9072120381, -20.1536882669), (0, -40.3073765337), (-34.9072120381, -20.1536882669)):
            Hole(F6_4_D / 2, depth=F6_4_DEPTH)
            with Locations((0, 0, -(F6_4_DEPTH + F6_4_TIP / 2))):  # 118° drill point
                Cone(0, F6_4_D / 2, F6_4_TIP, mode=Mode.SUBTRACT)


with BuildPart() as f5e:
    # F4 (on face) → F5, piece 5 (new body)
    with BuildSketch(Plane.XY):
        with Locations((34.9072120381, -20.1536882669)):
            Circle(F4_R)
    extrude(amount=-F5_DEPTH)

    # F6#5
    with Locations(Plane.XY):
        with Locations((-34.9072120381, 20.1536882669), (0, 40.3073765337), (34.9072120381, 20.1536882669), (34.9072120381, -20.1536882669), (0, -40.3073765337), (-34.9072120381, -20.1536882669)):
            Hole(F6_5_D / 2, depth=F6_5_DEPTH)
            with Locations((0, 0, -(F6_5_DEPTH + F6_5_TIP / 2))):  # 118° drill point
                Cone(0, F6_5_D / 2, F6_5_TIP, mode=Mode.SUBTRACT)


with BuildPart() as f5f:
    # F4 (on face) → F5, piece 6 (new body)
    with BuildSketch(Plane.XY):
        with Locations((34.9072120381, 20.1536882669)):
            Circle(F4_R)
    extrude(amount=-F5_DEPTH)

    # F6#6
    with Locations(Plane.XY):
        with Locations((-34.9072120381, 20.1536882669), (0, 40.3073765337), (34.9072120381, 20.1536882669), (34.9072120381, -20.1536882669), (0, -40.3073765337), (-34.9072120381, -20.1536882669)):
            Hole(F6_6_D / 2, depth=F6_6_DEPTH)
            with Locations((0, 0, -(F6_6_DEPTH + F6_6_TIP / 2))):  # 118° drill point
                Cone(0, F6_6_D / 2, F6_6_TIP, mode=Mode.SUBTRACT)


solid = Compound([f1.part, f3.part, f3b.part, f3c.part, f3d.part, f3e.part, f3f.part, f5.part, f5b.part, f5c.part, f5d.part, f5e.part, f5f.part])
